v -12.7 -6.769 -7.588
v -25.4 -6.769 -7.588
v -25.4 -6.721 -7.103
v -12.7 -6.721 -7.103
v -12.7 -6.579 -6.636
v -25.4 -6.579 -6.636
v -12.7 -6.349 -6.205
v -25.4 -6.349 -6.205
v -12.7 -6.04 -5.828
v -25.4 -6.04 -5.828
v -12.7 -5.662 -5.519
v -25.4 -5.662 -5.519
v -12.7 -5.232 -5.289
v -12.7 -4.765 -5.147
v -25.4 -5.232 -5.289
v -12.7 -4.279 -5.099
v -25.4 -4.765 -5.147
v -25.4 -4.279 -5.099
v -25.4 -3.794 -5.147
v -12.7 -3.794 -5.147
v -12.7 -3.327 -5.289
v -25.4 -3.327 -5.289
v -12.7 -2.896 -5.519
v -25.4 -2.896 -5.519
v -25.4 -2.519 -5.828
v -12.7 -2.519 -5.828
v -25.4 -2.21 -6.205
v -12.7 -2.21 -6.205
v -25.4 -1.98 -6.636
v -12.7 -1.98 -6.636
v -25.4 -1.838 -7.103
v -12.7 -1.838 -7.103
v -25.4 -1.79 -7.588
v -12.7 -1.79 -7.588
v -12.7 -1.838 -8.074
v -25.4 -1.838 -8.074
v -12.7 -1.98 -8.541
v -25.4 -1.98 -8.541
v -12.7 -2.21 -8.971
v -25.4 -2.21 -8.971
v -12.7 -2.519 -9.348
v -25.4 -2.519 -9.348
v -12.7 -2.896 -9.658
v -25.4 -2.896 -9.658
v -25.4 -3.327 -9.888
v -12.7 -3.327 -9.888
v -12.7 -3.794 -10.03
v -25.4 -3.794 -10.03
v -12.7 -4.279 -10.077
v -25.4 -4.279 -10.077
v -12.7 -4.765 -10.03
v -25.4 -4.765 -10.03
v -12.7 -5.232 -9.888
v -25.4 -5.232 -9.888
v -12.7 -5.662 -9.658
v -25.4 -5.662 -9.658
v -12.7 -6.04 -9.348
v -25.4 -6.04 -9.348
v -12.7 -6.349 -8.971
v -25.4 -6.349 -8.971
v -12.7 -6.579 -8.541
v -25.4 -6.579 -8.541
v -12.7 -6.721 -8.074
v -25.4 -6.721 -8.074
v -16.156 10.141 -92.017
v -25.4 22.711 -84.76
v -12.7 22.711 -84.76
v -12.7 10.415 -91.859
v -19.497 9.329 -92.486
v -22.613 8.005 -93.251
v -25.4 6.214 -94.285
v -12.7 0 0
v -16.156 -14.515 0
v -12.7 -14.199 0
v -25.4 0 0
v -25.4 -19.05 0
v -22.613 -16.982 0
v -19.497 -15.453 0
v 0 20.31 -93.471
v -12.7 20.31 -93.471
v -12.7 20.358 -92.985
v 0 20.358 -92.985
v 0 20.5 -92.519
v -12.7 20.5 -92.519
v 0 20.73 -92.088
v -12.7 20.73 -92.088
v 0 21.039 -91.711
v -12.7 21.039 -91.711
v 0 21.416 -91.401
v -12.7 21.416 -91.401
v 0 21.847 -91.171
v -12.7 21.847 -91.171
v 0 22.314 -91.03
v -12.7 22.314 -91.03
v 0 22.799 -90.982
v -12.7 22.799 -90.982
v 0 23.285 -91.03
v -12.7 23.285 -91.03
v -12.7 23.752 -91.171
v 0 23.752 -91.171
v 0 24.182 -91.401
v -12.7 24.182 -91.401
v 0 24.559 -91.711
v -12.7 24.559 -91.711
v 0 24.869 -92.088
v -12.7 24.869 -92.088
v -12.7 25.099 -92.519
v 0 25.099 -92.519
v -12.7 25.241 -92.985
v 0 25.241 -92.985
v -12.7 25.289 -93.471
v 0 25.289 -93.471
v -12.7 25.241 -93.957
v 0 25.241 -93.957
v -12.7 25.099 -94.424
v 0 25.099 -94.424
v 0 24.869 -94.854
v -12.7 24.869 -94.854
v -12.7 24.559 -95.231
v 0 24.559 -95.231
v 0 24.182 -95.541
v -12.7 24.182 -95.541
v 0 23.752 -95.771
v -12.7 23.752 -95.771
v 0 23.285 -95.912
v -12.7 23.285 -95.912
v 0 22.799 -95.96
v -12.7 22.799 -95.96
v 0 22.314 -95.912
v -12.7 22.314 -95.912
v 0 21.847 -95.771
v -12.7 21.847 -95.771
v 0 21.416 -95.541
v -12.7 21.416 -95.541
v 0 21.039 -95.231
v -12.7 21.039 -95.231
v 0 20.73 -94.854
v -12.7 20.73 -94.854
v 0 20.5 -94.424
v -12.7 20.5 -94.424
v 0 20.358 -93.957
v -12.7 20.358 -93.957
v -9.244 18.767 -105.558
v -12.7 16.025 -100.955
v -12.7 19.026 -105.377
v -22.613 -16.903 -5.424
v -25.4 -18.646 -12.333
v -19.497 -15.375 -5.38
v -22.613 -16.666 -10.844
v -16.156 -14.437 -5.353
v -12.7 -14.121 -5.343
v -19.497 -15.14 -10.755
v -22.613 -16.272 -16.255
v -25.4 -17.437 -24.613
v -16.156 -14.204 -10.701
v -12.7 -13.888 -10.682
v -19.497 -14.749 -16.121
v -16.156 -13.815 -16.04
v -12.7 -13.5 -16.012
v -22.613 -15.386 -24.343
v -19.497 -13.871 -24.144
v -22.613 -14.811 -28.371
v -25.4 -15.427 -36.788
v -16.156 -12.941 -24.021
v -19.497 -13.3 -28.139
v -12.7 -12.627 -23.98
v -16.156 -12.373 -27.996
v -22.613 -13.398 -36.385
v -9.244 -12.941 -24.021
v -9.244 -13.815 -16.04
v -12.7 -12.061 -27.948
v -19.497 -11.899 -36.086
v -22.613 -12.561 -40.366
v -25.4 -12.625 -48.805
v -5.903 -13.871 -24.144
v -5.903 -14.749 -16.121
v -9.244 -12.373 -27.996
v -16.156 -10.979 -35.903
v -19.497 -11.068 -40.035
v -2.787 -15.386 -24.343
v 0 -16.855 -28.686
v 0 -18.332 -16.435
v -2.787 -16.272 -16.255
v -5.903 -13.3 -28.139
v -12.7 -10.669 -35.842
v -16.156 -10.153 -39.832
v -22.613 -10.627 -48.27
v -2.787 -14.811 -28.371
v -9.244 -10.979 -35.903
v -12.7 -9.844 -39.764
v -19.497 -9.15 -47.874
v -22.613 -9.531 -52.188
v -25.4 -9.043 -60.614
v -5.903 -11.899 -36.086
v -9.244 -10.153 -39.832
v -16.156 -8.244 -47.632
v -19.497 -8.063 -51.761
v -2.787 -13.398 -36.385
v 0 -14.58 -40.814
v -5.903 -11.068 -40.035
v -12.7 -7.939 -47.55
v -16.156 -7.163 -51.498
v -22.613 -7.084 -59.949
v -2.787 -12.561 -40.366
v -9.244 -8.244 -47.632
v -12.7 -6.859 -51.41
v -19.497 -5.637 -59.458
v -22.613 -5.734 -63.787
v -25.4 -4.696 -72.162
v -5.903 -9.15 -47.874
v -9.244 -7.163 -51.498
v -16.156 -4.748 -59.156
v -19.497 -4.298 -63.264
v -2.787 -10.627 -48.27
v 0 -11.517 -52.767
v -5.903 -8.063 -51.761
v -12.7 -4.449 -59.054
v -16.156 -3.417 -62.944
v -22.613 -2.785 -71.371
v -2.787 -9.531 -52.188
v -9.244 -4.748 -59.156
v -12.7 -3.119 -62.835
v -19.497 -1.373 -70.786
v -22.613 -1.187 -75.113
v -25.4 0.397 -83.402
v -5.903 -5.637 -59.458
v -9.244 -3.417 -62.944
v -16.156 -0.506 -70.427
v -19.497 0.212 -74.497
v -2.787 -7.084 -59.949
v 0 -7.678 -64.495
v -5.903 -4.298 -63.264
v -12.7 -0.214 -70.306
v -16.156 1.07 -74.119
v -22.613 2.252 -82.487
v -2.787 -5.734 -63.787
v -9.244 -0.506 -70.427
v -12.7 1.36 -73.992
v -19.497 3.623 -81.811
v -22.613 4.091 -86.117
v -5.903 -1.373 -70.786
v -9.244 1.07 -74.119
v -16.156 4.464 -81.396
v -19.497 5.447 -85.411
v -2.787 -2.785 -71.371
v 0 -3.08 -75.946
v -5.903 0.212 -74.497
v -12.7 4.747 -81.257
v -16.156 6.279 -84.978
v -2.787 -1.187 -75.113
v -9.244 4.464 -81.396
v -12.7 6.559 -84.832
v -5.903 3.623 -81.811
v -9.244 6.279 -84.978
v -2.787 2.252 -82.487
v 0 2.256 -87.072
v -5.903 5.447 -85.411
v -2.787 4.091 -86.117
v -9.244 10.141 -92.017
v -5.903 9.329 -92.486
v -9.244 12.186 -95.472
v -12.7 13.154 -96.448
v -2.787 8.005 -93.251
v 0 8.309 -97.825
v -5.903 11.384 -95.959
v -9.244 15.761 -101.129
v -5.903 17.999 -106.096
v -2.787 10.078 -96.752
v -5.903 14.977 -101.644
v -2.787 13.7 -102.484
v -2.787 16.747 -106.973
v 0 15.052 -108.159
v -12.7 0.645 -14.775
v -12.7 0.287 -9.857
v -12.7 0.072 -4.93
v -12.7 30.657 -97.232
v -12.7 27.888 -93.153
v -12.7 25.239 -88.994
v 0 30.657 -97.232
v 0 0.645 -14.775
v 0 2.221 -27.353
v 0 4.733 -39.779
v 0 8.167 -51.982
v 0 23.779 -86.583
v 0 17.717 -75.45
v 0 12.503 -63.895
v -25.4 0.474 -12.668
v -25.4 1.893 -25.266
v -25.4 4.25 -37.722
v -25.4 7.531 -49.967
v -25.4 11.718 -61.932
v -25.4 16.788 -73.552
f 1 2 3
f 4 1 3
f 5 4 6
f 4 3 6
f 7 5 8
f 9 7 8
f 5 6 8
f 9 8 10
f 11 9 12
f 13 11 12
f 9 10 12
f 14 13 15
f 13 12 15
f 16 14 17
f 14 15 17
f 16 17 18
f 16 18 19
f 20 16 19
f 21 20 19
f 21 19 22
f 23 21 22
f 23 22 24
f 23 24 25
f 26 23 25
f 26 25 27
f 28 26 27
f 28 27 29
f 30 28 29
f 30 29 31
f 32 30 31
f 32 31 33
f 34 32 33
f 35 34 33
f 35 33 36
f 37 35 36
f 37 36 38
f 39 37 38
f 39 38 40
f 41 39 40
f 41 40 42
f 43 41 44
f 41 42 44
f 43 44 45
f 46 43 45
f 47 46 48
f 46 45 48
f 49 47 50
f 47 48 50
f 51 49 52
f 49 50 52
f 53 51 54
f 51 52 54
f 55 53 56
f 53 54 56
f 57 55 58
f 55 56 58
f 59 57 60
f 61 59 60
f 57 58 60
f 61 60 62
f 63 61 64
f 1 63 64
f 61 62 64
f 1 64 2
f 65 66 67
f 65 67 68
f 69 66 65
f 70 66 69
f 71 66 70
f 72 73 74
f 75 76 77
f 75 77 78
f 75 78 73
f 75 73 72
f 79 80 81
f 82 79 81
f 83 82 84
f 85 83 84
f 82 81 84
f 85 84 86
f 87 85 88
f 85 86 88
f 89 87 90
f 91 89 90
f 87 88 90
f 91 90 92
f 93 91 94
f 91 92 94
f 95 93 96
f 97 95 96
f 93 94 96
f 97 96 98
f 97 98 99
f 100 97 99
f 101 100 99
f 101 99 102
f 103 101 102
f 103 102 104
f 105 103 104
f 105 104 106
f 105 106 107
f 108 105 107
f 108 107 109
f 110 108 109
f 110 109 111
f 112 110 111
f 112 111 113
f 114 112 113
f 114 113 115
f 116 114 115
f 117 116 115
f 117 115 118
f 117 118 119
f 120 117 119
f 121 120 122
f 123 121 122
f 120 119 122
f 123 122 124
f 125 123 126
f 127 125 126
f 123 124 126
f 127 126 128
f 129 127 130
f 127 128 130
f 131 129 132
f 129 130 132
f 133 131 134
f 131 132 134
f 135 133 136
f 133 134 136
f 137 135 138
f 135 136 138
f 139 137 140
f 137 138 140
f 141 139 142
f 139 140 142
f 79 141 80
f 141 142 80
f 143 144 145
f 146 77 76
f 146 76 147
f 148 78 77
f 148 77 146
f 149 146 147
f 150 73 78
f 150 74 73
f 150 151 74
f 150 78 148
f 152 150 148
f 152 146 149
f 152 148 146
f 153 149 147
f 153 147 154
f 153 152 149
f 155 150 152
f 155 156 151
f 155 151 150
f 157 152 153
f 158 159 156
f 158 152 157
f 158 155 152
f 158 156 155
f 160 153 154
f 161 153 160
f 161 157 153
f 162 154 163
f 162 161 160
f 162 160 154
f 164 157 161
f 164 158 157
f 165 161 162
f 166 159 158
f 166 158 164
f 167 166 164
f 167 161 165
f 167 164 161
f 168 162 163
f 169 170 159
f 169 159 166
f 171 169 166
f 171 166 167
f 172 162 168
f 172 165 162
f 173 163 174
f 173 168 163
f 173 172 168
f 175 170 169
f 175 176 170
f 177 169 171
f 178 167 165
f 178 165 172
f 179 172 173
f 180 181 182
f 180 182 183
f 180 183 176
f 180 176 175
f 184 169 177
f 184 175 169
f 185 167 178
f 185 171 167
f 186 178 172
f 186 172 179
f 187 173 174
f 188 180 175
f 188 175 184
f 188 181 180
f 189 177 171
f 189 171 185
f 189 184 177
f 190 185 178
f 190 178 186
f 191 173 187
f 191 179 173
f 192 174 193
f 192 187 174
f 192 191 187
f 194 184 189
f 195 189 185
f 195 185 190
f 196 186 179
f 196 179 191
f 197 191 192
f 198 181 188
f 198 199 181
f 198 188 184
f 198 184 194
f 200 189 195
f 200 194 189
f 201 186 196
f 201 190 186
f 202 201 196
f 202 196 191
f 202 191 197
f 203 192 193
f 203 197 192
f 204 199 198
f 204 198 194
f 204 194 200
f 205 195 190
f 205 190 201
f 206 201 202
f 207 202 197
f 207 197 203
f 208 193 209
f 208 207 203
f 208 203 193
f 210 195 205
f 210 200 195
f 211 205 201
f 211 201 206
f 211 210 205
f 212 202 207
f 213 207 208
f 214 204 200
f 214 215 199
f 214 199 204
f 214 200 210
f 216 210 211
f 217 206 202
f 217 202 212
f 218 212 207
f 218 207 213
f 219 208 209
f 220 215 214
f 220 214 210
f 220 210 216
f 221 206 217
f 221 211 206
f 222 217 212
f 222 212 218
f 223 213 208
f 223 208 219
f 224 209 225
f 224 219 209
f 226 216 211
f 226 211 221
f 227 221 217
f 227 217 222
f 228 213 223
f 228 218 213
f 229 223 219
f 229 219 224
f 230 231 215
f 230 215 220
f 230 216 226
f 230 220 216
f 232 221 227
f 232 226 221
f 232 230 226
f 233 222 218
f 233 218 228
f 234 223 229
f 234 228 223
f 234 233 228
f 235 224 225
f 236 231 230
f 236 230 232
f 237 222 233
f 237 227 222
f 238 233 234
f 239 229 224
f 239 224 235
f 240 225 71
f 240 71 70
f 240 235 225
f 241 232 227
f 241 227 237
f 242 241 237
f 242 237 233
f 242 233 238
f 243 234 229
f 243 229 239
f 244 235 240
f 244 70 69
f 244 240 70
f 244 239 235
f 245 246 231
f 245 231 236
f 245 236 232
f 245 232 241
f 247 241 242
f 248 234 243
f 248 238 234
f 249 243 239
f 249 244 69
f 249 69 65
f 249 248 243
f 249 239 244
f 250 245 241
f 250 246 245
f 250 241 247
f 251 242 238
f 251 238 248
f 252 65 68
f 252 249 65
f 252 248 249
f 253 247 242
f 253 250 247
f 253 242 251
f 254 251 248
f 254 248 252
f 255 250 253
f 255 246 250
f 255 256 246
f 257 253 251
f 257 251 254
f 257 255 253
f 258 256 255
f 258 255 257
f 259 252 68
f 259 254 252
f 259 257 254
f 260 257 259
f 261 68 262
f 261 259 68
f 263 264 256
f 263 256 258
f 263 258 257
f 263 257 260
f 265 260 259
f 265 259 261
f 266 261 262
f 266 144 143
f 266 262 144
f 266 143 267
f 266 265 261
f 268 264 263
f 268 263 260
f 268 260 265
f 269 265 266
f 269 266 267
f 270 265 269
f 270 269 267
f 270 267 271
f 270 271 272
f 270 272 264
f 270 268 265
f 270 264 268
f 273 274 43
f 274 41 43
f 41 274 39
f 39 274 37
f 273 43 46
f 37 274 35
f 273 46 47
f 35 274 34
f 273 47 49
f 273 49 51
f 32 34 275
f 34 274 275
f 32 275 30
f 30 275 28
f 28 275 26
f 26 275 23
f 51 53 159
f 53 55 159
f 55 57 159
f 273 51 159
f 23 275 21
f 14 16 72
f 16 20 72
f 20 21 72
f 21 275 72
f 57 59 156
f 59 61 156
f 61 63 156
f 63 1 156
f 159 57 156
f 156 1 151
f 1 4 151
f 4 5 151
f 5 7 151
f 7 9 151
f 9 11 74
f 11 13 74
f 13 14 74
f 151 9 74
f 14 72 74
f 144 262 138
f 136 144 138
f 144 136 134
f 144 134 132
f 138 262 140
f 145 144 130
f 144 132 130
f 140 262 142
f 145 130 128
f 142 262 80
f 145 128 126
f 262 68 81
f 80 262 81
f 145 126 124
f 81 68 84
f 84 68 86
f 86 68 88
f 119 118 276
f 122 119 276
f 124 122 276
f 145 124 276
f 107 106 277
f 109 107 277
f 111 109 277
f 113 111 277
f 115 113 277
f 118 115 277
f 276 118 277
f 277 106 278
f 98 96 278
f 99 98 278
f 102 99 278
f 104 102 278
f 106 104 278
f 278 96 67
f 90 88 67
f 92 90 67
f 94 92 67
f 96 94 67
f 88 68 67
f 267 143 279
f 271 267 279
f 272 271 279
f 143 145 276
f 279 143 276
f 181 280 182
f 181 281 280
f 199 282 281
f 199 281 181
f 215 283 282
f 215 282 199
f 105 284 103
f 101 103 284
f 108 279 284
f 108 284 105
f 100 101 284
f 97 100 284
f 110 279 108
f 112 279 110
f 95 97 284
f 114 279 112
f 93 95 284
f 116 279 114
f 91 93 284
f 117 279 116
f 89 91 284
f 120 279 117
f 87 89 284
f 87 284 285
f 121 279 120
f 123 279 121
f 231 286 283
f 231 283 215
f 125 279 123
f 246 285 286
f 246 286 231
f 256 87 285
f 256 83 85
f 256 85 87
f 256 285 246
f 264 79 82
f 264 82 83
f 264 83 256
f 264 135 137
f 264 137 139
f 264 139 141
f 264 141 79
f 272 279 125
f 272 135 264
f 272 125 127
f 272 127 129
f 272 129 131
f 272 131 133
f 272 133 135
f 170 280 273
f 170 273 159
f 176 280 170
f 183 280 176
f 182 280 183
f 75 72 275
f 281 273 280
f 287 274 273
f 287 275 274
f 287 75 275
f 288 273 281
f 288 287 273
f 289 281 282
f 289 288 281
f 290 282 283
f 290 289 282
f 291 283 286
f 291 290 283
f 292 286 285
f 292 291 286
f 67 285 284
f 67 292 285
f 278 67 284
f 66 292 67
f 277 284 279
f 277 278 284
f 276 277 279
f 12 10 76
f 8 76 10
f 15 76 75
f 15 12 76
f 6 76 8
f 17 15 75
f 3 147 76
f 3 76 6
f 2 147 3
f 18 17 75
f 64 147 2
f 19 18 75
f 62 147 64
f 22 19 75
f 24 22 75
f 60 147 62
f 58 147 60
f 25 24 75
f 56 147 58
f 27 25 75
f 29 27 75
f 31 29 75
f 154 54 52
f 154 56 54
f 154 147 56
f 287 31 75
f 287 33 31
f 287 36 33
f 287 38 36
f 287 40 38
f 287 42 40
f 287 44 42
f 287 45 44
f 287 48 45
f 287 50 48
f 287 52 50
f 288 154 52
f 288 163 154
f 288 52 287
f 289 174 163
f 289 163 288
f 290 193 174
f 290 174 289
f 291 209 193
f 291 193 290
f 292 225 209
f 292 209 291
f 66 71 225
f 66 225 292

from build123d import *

# Parameters (mm, degrees)
REVOLVE1_ANGLE             = 35
CUT_EXTRUDE1_DEPTH         = 12.7
CUT_EXTRUDE2_DEPTH         = 12.7
F_9_0_196_DIAMETER_HOLE1_D = 4.9784


with BuildPart() as part:
    # Sketch1 → Revolve1 (revolve)
    with BuildSketch(Plane(origin=(0, 0, 0), x_dir=(0, 1, 0), z_dir=(0, 0, 1))):
        with BuildLine():
            Line((0, 0), (0, 25.4))
            Line((0, 25.4), (-19.05, 25.4))
            ThreePointArc((-19.05, 25.4), (-14.199031657, 12.7), (-19.05, 0))
            Line((-19.05, 0), (0, 0))
        make_face()
    revolve(axis=Axis((-25.4, 169.5196, 0), (1, 0, 0)), revolution_arc=REVOLVE1_ANGLE)

    # Sketch2 → Cut-Extrude1 (cut)
    with BuildSketch(Plane.YZ):
        with BuildLine():
            Line((-19.05, 0), (169.5196, 0))
            Line((169.5196, 0), (-18.332435741, -16.434923548))
            ThreePointArc((-18.332435741, -16.434923548), (-18.870523524, -8.225290428), (-19.05, 0))
        make_face()
    extrude(amount=-CUT_EXTRUDE1_DEPTH, mode=Mode.SUBTRACT)

    # Sketch3 → Cut-Extrude2 (cut)
    with BuildSketch(Plane(origin=(-25.4, 0, 0), x_dir=(0, -1, 0), z_dir=(-1, 0, 0))):
        with BuildLine():
            Line((-15.052426669, -108.159079172), (-169.5196, 0))
            Line((-169.5196, 0), (-6.213536019, -94.2848))
            ThreePointArc((-6.213536019, -94.2848), (-10.48161242, -101.318372226), (-15.052426669, -108.159079172))
        make_face()
    extrude(amount=-CUT_EXTRUDE2_DEPTH, mode=Mode.SUBTRACT)

    # #9 (0.196) Diameter Hole1 (through all)
    with Locations(Plane.YZ):
        with Locations((22.799344486, -93.471111446), (-4.279424248, -7.588229275)):
            Hole(F_9_0_196_DIAMETER_HOLE1_D / 2)


solid = part.part
